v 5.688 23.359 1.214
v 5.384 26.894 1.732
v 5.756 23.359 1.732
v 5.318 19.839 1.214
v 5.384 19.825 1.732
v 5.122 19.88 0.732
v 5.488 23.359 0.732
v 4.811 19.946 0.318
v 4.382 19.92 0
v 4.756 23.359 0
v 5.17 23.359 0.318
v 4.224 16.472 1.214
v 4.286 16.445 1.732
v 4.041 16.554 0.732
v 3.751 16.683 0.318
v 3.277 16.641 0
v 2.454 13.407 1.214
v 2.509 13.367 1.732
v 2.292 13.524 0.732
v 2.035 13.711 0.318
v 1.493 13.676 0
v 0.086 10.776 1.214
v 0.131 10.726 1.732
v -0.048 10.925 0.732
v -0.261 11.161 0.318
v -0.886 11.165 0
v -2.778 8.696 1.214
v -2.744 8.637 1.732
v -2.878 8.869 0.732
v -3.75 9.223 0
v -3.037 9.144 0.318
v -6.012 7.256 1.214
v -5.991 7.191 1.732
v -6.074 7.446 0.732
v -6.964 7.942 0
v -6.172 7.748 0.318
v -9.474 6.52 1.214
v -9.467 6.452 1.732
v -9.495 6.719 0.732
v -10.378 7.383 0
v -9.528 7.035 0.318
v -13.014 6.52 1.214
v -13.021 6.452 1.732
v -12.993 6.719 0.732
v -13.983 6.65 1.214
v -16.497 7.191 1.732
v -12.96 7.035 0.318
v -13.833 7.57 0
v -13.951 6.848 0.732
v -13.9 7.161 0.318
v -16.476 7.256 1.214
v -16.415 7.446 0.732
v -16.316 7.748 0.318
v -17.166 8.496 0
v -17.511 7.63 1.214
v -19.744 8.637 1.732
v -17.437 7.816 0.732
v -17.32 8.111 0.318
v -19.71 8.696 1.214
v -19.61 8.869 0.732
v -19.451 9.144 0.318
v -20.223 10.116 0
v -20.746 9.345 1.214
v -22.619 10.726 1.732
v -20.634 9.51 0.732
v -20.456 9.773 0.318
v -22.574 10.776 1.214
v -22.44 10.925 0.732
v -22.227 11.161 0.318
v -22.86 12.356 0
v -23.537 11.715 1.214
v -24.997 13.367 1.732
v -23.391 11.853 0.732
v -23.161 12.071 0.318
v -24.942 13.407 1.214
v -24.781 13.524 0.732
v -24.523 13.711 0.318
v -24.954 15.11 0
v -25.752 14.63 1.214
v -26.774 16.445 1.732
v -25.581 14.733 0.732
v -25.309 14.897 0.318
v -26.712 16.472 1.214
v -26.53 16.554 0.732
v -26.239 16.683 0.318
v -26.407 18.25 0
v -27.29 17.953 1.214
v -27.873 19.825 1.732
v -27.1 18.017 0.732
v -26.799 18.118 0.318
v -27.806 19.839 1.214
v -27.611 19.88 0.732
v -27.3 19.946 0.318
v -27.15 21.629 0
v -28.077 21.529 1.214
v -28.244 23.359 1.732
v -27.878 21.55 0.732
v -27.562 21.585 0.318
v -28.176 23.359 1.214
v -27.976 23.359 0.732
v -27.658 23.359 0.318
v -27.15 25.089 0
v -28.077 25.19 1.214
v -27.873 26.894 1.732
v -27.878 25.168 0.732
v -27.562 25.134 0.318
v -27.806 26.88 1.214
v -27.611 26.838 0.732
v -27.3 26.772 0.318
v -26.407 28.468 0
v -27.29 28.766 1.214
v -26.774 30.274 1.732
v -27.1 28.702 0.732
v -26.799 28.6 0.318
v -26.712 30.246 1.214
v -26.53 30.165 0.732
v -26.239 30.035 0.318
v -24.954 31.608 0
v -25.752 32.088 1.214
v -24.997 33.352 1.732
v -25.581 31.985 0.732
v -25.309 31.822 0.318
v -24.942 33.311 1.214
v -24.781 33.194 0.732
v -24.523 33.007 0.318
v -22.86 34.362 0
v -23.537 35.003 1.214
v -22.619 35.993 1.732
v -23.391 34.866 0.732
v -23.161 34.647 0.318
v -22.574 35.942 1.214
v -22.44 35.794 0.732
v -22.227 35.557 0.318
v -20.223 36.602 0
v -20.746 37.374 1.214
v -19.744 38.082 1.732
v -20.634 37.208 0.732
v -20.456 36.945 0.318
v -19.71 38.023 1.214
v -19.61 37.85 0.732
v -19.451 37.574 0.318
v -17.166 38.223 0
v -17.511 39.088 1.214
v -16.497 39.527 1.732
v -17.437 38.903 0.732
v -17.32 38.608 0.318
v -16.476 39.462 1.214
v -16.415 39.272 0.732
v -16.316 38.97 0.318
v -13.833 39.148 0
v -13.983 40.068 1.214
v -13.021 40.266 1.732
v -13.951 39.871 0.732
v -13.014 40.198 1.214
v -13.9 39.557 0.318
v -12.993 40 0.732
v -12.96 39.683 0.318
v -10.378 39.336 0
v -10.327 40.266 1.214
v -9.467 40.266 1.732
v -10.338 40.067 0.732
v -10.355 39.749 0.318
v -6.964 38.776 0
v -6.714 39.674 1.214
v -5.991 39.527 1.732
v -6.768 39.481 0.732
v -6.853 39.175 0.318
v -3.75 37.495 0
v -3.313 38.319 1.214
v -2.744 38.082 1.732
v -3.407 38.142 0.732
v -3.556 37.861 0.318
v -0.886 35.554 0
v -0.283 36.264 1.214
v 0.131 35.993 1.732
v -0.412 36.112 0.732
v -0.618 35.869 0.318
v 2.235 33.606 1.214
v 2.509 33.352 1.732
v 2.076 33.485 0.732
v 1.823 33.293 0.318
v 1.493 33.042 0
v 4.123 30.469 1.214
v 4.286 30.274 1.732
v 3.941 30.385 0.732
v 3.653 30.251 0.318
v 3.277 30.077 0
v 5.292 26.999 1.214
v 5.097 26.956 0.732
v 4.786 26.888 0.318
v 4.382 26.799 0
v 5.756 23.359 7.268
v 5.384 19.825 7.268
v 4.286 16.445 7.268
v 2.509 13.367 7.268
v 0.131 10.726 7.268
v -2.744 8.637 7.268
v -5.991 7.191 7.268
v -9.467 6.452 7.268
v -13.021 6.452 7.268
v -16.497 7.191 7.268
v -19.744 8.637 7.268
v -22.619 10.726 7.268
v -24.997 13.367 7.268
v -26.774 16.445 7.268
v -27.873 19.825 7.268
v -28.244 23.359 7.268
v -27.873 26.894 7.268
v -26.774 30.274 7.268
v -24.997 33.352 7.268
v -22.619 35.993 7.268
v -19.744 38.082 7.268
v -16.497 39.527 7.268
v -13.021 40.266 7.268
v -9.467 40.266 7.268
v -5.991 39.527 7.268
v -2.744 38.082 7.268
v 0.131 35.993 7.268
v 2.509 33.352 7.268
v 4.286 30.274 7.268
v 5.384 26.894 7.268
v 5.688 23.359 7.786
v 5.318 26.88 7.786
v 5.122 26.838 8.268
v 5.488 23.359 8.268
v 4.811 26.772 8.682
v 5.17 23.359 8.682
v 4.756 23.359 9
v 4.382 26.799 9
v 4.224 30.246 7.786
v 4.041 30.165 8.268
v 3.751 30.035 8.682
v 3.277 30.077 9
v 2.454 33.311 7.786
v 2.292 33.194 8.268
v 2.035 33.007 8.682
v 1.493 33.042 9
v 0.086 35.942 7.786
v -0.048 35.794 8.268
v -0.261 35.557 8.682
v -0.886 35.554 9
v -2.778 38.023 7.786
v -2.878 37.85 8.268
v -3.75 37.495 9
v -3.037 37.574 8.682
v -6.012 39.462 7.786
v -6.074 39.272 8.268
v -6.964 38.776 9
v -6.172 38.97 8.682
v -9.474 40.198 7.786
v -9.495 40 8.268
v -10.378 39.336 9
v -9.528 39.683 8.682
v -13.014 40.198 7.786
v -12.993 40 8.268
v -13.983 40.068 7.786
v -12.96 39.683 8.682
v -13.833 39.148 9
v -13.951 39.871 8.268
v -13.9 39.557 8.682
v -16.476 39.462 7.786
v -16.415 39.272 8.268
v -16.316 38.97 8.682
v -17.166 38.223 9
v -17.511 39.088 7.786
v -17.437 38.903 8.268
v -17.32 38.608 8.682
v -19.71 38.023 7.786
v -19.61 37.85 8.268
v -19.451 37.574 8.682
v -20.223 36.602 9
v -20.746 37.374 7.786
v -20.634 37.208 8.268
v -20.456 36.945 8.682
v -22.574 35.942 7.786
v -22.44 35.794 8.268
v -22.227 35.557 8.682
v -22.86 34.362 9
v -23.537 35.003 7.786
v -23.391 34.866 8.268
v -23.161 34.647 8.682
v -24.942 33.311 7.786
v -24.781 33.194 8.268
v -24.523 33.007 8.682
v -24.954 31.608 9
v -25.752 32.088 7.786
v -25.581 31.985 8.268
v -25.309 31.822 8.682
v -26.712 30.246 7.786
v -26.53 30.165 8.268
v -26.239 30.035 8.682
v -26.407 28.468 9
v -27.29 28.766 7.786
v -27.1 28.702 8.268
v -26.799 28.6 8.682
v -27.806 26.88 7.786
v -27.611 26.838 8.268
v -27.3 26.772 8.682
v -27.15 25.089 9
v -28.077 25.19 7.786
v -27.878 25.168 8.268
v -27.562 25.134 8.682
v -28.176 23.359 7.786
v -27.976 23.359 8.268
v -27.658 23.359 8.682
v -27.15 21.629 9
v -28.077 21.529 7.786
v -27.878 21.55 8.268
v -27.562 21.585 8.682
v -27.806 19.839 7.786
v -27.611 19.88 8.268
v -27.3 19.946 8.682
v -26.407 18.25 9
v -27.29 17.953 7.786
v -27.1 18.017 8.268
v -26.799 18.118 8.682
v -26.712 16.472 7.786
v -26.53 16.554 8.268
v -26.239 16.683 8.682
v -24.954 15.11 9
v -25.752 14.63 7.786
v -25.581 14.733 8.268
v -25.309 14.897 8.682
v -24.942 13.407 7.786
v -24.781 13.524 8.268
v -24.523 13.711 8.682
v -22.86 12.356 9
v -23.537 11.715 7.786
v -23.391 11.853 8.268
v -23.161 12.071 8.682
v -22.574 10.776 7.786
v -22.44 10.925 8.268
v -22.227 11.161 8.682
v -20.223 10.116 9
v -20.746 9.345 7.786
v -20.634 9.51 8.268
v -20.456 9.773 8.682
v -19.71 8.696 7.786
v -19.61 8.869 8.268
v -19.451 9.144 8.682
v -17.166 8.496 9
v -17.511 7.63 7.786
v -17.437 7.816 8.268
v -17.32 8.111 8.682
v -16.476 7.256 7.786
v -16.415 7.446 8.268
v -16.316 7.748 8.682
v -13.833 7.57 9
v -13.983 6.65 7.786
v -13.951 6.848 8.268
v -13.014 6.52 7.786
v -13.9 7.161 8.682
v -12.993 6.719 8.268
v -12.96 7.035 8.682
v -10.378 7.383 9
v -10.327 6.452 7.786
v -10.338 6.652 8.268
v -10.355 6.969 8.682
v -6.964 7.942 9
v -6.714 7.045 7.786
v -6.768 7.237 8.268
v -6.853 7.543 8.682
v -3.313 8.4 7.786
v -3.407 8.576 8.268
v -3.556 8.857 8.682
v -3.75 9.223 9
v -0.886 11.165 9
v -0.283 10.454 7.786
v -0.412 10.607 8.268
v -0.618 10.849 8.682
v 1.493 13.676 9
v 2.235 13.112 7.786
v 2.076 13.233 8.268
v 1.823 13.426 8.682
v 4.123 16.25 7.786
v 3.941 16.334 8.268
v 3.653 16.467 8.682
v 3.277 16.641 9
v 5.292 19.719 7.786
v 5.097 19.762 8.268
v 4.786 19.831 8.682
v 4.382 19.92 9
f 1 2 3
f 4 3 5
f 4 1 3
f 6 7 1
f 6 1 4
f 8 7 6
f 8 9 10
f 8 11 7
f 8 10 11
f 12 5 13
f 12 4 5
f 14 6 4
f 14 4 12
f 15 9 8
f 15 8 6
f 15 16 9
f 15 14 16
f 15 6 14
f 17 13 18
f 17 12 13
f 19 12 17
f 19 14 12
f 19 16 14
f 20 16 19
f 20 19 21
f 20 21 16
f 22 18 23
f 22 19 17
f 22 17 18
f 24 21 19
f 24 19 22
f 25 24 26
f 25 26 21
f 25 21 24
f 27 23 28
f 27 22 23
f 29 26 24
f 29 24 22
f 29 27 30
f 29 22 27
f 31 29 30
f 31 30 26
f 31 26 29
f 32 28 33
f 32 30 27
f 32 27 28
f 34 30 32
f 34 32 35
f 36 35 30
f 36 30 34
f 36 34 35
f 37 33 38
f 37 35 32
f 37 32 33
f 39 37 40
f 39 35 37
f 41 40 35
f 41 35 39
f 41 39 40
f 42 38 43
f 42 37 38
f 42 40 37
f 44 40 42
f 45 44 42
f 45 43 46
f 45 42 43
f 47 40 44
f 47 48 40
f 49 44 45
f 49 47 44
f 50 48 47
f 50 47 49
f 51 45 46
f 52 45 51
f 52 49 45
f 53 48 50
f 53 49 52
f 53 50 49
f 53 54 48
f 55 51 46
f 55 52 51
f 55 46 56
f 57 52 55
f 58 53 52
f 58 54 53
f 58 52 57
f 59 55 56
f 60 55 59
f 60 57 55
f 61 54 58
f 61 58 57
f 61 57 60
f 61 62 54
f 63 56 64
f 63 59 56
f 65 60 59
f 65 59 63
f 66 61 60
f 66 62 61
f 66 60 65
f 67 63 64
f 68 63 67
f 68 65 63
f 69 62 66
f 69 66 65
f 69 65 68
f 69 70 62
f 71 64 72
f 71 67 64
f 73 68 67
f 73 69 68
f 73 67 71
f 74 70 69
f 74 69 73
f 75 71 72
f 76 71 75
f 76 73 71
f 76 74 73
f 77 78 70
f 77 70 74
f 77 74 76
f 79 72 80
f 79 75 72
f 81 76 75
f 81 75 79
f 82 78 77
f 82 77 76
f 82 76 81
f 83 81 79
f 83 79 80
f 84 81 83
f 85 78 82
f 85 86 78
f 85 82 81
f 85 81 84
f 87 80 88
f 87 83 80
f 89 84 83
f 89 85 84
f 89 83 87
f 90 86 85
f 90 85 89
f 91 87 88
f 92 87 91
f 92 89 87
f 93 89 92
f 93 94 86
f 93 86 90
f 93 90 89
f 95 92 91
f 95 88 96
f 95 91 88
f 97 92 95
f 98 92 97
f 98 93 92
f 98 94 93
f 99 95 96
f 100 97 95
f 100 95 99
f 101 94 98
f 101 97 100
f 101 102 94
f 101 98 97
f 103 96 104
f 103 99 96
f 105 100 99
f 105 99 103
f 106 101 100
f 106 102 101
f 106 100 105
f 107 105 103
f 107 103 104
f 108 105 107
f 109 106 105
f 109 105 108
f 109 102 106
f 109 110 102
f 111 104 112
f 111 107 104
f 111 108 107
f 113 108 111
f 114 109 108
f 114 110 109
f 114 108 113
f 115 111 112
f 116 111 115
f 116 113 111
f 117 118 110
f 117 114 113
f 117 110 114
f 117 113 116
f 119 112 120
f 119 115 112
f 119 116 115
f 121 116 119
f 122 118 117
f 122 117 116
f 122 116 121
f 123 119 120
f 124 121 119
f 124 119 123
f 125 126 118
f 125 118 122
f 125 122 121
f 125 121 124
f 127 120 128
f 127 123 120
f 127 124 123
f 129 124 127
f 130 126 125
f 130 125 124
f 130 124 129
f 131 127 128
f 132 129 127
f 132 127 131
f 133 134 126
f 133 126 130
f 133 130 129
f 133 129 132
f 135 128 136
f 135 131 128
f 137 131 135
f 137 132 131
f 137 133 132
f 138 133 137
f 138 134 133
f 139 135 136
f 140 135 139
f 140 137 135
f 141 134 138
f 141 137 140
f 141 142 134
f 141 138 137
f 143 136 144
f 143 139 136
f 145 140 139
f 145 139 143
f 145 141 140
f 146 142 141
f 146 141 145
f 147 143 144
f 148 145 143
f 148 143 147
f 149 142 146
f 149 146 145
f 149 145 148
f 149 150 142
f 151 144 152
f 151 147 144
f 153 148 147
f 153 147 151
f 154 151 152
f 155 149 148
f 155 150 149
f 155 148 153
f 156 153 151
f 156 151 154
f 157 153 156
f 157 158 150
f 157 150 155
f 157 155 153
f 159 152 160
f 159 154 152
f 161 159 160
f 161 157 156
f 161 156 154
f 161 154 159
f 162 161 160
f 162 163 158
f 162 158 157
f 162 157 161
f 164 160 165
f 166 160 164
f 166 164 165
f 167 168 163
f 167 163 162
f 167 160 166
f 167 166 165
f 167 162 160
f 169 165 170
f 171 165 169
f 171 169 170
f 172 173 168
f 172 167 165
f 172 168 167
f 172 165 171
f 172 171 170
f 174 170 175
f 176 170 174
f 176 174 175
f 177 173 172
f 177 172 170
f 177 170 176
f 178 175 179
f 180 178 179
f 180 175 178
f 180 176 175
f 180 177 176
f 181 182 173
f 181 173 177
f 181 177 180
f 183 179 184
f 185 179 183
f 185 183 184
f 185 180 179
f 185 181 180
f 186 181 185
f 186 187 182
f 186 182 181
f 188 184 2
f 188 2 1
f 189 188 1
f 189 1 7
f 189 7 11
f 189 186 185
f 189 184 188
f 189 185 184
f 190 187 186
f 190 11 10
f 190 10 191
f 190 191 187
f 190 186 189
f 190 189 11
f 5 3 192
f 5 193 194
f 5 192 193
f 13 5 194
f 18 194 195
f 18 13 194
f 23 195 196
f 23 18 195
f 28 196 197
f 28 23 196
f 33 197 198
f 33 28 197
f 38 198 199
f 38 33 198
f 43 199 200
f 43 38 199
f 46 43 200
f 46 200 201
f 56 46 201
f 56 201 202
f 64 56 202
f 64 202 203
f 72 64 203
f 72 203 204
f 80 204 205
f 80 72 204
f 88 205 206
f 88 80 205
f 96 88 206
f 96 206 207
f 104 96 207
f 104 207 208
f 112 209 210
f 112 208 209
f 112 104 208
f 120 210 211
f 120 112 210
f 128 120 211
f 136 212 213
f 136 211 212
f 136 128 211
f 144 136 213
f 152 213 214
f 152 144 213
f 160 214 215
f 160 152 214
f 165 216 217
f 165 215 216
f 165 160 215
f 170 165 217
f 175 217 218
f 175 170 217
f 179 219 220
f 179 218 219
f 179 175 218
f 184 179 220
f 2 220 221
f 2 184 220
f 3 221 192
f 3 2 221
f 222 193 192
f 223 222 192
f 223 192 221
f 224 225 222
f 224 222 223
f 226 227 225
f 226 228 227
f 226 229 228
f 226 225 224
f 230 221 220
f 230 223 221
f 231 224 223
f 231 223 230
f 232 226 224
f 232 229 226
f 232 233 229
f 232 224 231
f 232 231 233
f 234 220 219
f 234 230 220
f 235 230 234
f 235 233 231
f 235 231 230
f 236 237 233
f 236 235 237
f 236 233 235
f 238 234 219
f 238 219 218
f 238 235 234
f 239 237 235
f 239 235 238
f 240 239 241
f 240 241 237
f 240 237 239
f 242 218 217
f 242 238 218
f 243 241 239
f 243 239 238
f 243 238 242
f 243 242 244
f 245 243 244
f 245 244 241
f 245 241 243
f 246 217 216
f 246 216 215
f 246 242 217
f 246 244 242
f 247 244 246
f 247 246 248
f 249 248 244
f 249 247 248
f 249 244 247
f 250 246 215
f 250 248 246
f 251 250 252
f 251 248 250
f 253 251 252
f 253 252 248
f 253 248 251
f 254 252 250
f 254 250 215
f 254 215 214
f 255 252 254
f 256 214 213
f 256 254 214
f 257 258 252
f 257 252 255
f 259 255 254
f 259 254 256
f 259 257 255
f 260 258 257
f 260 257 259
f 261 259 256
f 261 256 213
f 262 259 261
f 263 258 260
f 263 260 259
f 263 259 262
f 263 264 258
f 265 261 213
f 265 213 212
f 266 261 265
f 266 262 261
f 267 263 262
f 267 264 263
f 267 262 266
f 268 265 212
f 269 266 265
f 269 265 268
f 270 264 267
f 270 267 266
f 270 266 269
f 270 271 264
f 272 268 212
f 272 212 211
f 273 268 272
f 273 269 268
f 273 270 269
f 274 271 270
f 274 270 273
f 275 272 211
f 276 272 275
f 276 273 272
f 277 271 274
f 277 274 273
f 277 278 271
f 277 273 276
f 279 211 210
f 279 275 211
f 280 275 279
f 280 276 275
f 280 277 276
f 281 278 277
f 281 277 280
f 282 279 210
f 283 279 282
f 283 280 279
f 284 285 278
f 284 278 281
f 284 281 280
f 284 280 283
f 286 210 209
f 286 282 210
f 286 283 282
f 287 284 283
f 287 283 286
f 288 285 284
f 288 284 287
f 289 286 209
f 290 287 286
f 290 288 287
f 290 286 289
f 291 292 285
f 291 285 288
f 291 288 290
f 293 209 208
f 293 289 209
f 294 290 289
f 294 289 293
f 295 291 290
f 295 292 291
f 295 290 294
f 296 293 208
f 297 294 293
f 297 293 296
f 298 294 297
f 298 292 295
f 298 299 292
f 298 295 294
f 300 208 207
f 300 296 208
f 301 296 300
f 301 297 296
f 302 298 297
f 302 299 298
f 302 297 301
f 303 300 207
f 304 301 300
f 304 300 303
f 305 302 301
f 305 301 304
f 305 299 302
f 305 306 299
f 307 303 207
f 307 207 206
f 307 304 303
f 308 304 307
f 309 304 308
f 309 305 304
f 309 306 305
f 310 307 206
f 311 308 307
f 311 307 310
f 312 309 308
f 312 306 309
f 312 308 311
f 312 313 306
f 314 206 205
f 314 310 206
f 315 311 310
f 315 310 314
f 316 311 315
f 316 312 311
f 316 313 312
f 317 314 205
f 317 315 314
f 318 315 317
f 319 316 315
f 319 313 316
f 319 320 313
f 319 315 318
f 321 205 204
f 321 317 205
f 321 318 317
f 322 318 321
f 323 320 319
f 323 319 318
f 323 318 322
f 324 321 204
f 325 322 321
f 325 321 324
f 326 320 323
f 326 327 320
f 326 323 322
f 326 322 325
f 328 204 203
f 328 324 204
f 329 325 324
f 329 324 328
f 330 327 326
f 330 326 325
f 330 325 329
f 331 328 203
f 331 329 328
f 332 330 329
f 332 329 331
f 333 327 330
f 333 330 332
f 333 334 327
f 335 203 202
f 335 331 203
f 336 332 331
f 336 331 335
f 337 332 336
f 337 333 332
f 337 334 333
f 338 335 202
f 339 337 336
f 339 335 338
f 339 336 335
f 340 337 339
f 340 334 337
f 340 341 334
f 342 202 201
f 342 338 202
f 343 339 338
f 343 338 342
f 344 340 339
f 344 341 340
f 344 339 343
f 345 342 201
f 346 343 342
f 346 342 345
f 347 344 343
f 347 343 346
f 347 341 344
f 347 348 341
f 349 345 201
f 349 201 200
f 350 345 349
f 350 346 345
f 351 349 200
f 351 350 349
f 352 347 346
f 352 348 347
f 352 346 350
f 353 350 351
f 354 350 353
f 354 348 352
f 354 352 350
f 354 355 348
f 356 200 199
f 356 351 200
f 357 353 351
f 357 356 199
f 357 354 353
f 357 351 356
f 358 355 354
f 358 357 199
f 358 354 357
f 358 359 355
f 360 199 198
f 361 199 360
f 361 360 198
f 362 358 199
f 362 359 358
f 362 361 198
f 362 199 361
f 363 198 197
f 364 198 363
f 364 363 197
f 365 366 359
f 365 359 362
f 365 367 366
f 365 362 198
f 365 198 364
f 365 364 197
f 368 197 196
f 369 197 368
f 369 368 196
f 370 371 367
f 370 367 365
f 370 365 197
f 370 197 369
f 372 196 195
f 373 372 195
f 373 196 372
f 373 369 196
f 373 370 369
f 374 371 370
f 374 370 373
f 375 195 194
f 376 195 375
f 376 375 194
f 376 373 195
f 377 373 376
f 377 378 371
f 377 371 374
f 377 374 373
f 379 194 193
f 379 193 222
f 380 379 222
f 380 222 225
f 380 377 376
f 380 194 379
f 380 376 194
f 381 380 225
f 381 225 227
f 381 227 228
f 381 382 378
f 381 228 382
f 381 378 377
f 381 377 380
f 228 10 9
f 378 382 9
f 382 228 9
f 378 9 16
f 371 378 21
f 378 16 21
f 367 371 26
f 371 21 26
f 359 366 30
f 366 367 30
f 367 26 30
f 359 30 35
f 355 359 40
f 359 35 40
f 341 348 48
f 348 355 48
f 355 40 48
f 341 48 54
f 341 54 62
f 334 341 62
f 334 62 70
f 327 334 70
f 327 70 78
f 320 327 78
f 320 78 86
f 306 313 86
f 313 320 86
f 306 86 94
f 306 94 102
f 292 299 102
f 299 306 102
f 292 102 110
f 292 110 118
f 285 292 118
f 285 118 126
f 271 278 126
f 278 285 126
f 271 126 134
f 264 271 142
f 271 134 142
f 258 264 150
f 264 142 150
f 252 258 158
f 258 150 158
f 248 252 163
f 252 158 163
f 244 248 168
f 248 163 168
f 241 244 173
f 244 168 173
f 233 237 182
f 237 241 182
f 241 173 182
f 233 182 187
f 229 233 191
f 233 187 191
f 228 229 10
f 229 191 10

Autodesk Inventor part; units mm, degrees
ref_plane "YZ Plane" through (0, 0, 0) normal (1, 0, 0) x (0, 1, 0)
ref_plane "XZ Plane" through (0, 0, 0) normal (0, 1, 0) x (-1, 0, 0)
ref_plane "XY Plane" through (0, 0, 0) normal (0, 0, 1) x (1, 0, 0)
ref_plane "Work Plane1" through (0, 0, 0) normal (0, 0, 1) x (1, 0, 0)
sketch "Sketch1" plane through (0, 0, 0) normal (0, 0, 1) x (1, 0, 0)
  circle A0 centre (-11.2441, 23.3592) radius 16
  circle A1 centre (-11.2441, 23.3592) radius 17
  point P0 (0, 0)
  dimension "d0" = 32
  dimension "d1" = 34
extrude "Extrusion1" add sketch "Sketch1" along normal blind 9
fillet "Fillet1" radius 2 1 edges at (-28.2441, 23.3592, 9)
fillet "Fillet2" radius 2 1 edges at (-28.2441, 23.3592, 0)
properties part number "Tire"
